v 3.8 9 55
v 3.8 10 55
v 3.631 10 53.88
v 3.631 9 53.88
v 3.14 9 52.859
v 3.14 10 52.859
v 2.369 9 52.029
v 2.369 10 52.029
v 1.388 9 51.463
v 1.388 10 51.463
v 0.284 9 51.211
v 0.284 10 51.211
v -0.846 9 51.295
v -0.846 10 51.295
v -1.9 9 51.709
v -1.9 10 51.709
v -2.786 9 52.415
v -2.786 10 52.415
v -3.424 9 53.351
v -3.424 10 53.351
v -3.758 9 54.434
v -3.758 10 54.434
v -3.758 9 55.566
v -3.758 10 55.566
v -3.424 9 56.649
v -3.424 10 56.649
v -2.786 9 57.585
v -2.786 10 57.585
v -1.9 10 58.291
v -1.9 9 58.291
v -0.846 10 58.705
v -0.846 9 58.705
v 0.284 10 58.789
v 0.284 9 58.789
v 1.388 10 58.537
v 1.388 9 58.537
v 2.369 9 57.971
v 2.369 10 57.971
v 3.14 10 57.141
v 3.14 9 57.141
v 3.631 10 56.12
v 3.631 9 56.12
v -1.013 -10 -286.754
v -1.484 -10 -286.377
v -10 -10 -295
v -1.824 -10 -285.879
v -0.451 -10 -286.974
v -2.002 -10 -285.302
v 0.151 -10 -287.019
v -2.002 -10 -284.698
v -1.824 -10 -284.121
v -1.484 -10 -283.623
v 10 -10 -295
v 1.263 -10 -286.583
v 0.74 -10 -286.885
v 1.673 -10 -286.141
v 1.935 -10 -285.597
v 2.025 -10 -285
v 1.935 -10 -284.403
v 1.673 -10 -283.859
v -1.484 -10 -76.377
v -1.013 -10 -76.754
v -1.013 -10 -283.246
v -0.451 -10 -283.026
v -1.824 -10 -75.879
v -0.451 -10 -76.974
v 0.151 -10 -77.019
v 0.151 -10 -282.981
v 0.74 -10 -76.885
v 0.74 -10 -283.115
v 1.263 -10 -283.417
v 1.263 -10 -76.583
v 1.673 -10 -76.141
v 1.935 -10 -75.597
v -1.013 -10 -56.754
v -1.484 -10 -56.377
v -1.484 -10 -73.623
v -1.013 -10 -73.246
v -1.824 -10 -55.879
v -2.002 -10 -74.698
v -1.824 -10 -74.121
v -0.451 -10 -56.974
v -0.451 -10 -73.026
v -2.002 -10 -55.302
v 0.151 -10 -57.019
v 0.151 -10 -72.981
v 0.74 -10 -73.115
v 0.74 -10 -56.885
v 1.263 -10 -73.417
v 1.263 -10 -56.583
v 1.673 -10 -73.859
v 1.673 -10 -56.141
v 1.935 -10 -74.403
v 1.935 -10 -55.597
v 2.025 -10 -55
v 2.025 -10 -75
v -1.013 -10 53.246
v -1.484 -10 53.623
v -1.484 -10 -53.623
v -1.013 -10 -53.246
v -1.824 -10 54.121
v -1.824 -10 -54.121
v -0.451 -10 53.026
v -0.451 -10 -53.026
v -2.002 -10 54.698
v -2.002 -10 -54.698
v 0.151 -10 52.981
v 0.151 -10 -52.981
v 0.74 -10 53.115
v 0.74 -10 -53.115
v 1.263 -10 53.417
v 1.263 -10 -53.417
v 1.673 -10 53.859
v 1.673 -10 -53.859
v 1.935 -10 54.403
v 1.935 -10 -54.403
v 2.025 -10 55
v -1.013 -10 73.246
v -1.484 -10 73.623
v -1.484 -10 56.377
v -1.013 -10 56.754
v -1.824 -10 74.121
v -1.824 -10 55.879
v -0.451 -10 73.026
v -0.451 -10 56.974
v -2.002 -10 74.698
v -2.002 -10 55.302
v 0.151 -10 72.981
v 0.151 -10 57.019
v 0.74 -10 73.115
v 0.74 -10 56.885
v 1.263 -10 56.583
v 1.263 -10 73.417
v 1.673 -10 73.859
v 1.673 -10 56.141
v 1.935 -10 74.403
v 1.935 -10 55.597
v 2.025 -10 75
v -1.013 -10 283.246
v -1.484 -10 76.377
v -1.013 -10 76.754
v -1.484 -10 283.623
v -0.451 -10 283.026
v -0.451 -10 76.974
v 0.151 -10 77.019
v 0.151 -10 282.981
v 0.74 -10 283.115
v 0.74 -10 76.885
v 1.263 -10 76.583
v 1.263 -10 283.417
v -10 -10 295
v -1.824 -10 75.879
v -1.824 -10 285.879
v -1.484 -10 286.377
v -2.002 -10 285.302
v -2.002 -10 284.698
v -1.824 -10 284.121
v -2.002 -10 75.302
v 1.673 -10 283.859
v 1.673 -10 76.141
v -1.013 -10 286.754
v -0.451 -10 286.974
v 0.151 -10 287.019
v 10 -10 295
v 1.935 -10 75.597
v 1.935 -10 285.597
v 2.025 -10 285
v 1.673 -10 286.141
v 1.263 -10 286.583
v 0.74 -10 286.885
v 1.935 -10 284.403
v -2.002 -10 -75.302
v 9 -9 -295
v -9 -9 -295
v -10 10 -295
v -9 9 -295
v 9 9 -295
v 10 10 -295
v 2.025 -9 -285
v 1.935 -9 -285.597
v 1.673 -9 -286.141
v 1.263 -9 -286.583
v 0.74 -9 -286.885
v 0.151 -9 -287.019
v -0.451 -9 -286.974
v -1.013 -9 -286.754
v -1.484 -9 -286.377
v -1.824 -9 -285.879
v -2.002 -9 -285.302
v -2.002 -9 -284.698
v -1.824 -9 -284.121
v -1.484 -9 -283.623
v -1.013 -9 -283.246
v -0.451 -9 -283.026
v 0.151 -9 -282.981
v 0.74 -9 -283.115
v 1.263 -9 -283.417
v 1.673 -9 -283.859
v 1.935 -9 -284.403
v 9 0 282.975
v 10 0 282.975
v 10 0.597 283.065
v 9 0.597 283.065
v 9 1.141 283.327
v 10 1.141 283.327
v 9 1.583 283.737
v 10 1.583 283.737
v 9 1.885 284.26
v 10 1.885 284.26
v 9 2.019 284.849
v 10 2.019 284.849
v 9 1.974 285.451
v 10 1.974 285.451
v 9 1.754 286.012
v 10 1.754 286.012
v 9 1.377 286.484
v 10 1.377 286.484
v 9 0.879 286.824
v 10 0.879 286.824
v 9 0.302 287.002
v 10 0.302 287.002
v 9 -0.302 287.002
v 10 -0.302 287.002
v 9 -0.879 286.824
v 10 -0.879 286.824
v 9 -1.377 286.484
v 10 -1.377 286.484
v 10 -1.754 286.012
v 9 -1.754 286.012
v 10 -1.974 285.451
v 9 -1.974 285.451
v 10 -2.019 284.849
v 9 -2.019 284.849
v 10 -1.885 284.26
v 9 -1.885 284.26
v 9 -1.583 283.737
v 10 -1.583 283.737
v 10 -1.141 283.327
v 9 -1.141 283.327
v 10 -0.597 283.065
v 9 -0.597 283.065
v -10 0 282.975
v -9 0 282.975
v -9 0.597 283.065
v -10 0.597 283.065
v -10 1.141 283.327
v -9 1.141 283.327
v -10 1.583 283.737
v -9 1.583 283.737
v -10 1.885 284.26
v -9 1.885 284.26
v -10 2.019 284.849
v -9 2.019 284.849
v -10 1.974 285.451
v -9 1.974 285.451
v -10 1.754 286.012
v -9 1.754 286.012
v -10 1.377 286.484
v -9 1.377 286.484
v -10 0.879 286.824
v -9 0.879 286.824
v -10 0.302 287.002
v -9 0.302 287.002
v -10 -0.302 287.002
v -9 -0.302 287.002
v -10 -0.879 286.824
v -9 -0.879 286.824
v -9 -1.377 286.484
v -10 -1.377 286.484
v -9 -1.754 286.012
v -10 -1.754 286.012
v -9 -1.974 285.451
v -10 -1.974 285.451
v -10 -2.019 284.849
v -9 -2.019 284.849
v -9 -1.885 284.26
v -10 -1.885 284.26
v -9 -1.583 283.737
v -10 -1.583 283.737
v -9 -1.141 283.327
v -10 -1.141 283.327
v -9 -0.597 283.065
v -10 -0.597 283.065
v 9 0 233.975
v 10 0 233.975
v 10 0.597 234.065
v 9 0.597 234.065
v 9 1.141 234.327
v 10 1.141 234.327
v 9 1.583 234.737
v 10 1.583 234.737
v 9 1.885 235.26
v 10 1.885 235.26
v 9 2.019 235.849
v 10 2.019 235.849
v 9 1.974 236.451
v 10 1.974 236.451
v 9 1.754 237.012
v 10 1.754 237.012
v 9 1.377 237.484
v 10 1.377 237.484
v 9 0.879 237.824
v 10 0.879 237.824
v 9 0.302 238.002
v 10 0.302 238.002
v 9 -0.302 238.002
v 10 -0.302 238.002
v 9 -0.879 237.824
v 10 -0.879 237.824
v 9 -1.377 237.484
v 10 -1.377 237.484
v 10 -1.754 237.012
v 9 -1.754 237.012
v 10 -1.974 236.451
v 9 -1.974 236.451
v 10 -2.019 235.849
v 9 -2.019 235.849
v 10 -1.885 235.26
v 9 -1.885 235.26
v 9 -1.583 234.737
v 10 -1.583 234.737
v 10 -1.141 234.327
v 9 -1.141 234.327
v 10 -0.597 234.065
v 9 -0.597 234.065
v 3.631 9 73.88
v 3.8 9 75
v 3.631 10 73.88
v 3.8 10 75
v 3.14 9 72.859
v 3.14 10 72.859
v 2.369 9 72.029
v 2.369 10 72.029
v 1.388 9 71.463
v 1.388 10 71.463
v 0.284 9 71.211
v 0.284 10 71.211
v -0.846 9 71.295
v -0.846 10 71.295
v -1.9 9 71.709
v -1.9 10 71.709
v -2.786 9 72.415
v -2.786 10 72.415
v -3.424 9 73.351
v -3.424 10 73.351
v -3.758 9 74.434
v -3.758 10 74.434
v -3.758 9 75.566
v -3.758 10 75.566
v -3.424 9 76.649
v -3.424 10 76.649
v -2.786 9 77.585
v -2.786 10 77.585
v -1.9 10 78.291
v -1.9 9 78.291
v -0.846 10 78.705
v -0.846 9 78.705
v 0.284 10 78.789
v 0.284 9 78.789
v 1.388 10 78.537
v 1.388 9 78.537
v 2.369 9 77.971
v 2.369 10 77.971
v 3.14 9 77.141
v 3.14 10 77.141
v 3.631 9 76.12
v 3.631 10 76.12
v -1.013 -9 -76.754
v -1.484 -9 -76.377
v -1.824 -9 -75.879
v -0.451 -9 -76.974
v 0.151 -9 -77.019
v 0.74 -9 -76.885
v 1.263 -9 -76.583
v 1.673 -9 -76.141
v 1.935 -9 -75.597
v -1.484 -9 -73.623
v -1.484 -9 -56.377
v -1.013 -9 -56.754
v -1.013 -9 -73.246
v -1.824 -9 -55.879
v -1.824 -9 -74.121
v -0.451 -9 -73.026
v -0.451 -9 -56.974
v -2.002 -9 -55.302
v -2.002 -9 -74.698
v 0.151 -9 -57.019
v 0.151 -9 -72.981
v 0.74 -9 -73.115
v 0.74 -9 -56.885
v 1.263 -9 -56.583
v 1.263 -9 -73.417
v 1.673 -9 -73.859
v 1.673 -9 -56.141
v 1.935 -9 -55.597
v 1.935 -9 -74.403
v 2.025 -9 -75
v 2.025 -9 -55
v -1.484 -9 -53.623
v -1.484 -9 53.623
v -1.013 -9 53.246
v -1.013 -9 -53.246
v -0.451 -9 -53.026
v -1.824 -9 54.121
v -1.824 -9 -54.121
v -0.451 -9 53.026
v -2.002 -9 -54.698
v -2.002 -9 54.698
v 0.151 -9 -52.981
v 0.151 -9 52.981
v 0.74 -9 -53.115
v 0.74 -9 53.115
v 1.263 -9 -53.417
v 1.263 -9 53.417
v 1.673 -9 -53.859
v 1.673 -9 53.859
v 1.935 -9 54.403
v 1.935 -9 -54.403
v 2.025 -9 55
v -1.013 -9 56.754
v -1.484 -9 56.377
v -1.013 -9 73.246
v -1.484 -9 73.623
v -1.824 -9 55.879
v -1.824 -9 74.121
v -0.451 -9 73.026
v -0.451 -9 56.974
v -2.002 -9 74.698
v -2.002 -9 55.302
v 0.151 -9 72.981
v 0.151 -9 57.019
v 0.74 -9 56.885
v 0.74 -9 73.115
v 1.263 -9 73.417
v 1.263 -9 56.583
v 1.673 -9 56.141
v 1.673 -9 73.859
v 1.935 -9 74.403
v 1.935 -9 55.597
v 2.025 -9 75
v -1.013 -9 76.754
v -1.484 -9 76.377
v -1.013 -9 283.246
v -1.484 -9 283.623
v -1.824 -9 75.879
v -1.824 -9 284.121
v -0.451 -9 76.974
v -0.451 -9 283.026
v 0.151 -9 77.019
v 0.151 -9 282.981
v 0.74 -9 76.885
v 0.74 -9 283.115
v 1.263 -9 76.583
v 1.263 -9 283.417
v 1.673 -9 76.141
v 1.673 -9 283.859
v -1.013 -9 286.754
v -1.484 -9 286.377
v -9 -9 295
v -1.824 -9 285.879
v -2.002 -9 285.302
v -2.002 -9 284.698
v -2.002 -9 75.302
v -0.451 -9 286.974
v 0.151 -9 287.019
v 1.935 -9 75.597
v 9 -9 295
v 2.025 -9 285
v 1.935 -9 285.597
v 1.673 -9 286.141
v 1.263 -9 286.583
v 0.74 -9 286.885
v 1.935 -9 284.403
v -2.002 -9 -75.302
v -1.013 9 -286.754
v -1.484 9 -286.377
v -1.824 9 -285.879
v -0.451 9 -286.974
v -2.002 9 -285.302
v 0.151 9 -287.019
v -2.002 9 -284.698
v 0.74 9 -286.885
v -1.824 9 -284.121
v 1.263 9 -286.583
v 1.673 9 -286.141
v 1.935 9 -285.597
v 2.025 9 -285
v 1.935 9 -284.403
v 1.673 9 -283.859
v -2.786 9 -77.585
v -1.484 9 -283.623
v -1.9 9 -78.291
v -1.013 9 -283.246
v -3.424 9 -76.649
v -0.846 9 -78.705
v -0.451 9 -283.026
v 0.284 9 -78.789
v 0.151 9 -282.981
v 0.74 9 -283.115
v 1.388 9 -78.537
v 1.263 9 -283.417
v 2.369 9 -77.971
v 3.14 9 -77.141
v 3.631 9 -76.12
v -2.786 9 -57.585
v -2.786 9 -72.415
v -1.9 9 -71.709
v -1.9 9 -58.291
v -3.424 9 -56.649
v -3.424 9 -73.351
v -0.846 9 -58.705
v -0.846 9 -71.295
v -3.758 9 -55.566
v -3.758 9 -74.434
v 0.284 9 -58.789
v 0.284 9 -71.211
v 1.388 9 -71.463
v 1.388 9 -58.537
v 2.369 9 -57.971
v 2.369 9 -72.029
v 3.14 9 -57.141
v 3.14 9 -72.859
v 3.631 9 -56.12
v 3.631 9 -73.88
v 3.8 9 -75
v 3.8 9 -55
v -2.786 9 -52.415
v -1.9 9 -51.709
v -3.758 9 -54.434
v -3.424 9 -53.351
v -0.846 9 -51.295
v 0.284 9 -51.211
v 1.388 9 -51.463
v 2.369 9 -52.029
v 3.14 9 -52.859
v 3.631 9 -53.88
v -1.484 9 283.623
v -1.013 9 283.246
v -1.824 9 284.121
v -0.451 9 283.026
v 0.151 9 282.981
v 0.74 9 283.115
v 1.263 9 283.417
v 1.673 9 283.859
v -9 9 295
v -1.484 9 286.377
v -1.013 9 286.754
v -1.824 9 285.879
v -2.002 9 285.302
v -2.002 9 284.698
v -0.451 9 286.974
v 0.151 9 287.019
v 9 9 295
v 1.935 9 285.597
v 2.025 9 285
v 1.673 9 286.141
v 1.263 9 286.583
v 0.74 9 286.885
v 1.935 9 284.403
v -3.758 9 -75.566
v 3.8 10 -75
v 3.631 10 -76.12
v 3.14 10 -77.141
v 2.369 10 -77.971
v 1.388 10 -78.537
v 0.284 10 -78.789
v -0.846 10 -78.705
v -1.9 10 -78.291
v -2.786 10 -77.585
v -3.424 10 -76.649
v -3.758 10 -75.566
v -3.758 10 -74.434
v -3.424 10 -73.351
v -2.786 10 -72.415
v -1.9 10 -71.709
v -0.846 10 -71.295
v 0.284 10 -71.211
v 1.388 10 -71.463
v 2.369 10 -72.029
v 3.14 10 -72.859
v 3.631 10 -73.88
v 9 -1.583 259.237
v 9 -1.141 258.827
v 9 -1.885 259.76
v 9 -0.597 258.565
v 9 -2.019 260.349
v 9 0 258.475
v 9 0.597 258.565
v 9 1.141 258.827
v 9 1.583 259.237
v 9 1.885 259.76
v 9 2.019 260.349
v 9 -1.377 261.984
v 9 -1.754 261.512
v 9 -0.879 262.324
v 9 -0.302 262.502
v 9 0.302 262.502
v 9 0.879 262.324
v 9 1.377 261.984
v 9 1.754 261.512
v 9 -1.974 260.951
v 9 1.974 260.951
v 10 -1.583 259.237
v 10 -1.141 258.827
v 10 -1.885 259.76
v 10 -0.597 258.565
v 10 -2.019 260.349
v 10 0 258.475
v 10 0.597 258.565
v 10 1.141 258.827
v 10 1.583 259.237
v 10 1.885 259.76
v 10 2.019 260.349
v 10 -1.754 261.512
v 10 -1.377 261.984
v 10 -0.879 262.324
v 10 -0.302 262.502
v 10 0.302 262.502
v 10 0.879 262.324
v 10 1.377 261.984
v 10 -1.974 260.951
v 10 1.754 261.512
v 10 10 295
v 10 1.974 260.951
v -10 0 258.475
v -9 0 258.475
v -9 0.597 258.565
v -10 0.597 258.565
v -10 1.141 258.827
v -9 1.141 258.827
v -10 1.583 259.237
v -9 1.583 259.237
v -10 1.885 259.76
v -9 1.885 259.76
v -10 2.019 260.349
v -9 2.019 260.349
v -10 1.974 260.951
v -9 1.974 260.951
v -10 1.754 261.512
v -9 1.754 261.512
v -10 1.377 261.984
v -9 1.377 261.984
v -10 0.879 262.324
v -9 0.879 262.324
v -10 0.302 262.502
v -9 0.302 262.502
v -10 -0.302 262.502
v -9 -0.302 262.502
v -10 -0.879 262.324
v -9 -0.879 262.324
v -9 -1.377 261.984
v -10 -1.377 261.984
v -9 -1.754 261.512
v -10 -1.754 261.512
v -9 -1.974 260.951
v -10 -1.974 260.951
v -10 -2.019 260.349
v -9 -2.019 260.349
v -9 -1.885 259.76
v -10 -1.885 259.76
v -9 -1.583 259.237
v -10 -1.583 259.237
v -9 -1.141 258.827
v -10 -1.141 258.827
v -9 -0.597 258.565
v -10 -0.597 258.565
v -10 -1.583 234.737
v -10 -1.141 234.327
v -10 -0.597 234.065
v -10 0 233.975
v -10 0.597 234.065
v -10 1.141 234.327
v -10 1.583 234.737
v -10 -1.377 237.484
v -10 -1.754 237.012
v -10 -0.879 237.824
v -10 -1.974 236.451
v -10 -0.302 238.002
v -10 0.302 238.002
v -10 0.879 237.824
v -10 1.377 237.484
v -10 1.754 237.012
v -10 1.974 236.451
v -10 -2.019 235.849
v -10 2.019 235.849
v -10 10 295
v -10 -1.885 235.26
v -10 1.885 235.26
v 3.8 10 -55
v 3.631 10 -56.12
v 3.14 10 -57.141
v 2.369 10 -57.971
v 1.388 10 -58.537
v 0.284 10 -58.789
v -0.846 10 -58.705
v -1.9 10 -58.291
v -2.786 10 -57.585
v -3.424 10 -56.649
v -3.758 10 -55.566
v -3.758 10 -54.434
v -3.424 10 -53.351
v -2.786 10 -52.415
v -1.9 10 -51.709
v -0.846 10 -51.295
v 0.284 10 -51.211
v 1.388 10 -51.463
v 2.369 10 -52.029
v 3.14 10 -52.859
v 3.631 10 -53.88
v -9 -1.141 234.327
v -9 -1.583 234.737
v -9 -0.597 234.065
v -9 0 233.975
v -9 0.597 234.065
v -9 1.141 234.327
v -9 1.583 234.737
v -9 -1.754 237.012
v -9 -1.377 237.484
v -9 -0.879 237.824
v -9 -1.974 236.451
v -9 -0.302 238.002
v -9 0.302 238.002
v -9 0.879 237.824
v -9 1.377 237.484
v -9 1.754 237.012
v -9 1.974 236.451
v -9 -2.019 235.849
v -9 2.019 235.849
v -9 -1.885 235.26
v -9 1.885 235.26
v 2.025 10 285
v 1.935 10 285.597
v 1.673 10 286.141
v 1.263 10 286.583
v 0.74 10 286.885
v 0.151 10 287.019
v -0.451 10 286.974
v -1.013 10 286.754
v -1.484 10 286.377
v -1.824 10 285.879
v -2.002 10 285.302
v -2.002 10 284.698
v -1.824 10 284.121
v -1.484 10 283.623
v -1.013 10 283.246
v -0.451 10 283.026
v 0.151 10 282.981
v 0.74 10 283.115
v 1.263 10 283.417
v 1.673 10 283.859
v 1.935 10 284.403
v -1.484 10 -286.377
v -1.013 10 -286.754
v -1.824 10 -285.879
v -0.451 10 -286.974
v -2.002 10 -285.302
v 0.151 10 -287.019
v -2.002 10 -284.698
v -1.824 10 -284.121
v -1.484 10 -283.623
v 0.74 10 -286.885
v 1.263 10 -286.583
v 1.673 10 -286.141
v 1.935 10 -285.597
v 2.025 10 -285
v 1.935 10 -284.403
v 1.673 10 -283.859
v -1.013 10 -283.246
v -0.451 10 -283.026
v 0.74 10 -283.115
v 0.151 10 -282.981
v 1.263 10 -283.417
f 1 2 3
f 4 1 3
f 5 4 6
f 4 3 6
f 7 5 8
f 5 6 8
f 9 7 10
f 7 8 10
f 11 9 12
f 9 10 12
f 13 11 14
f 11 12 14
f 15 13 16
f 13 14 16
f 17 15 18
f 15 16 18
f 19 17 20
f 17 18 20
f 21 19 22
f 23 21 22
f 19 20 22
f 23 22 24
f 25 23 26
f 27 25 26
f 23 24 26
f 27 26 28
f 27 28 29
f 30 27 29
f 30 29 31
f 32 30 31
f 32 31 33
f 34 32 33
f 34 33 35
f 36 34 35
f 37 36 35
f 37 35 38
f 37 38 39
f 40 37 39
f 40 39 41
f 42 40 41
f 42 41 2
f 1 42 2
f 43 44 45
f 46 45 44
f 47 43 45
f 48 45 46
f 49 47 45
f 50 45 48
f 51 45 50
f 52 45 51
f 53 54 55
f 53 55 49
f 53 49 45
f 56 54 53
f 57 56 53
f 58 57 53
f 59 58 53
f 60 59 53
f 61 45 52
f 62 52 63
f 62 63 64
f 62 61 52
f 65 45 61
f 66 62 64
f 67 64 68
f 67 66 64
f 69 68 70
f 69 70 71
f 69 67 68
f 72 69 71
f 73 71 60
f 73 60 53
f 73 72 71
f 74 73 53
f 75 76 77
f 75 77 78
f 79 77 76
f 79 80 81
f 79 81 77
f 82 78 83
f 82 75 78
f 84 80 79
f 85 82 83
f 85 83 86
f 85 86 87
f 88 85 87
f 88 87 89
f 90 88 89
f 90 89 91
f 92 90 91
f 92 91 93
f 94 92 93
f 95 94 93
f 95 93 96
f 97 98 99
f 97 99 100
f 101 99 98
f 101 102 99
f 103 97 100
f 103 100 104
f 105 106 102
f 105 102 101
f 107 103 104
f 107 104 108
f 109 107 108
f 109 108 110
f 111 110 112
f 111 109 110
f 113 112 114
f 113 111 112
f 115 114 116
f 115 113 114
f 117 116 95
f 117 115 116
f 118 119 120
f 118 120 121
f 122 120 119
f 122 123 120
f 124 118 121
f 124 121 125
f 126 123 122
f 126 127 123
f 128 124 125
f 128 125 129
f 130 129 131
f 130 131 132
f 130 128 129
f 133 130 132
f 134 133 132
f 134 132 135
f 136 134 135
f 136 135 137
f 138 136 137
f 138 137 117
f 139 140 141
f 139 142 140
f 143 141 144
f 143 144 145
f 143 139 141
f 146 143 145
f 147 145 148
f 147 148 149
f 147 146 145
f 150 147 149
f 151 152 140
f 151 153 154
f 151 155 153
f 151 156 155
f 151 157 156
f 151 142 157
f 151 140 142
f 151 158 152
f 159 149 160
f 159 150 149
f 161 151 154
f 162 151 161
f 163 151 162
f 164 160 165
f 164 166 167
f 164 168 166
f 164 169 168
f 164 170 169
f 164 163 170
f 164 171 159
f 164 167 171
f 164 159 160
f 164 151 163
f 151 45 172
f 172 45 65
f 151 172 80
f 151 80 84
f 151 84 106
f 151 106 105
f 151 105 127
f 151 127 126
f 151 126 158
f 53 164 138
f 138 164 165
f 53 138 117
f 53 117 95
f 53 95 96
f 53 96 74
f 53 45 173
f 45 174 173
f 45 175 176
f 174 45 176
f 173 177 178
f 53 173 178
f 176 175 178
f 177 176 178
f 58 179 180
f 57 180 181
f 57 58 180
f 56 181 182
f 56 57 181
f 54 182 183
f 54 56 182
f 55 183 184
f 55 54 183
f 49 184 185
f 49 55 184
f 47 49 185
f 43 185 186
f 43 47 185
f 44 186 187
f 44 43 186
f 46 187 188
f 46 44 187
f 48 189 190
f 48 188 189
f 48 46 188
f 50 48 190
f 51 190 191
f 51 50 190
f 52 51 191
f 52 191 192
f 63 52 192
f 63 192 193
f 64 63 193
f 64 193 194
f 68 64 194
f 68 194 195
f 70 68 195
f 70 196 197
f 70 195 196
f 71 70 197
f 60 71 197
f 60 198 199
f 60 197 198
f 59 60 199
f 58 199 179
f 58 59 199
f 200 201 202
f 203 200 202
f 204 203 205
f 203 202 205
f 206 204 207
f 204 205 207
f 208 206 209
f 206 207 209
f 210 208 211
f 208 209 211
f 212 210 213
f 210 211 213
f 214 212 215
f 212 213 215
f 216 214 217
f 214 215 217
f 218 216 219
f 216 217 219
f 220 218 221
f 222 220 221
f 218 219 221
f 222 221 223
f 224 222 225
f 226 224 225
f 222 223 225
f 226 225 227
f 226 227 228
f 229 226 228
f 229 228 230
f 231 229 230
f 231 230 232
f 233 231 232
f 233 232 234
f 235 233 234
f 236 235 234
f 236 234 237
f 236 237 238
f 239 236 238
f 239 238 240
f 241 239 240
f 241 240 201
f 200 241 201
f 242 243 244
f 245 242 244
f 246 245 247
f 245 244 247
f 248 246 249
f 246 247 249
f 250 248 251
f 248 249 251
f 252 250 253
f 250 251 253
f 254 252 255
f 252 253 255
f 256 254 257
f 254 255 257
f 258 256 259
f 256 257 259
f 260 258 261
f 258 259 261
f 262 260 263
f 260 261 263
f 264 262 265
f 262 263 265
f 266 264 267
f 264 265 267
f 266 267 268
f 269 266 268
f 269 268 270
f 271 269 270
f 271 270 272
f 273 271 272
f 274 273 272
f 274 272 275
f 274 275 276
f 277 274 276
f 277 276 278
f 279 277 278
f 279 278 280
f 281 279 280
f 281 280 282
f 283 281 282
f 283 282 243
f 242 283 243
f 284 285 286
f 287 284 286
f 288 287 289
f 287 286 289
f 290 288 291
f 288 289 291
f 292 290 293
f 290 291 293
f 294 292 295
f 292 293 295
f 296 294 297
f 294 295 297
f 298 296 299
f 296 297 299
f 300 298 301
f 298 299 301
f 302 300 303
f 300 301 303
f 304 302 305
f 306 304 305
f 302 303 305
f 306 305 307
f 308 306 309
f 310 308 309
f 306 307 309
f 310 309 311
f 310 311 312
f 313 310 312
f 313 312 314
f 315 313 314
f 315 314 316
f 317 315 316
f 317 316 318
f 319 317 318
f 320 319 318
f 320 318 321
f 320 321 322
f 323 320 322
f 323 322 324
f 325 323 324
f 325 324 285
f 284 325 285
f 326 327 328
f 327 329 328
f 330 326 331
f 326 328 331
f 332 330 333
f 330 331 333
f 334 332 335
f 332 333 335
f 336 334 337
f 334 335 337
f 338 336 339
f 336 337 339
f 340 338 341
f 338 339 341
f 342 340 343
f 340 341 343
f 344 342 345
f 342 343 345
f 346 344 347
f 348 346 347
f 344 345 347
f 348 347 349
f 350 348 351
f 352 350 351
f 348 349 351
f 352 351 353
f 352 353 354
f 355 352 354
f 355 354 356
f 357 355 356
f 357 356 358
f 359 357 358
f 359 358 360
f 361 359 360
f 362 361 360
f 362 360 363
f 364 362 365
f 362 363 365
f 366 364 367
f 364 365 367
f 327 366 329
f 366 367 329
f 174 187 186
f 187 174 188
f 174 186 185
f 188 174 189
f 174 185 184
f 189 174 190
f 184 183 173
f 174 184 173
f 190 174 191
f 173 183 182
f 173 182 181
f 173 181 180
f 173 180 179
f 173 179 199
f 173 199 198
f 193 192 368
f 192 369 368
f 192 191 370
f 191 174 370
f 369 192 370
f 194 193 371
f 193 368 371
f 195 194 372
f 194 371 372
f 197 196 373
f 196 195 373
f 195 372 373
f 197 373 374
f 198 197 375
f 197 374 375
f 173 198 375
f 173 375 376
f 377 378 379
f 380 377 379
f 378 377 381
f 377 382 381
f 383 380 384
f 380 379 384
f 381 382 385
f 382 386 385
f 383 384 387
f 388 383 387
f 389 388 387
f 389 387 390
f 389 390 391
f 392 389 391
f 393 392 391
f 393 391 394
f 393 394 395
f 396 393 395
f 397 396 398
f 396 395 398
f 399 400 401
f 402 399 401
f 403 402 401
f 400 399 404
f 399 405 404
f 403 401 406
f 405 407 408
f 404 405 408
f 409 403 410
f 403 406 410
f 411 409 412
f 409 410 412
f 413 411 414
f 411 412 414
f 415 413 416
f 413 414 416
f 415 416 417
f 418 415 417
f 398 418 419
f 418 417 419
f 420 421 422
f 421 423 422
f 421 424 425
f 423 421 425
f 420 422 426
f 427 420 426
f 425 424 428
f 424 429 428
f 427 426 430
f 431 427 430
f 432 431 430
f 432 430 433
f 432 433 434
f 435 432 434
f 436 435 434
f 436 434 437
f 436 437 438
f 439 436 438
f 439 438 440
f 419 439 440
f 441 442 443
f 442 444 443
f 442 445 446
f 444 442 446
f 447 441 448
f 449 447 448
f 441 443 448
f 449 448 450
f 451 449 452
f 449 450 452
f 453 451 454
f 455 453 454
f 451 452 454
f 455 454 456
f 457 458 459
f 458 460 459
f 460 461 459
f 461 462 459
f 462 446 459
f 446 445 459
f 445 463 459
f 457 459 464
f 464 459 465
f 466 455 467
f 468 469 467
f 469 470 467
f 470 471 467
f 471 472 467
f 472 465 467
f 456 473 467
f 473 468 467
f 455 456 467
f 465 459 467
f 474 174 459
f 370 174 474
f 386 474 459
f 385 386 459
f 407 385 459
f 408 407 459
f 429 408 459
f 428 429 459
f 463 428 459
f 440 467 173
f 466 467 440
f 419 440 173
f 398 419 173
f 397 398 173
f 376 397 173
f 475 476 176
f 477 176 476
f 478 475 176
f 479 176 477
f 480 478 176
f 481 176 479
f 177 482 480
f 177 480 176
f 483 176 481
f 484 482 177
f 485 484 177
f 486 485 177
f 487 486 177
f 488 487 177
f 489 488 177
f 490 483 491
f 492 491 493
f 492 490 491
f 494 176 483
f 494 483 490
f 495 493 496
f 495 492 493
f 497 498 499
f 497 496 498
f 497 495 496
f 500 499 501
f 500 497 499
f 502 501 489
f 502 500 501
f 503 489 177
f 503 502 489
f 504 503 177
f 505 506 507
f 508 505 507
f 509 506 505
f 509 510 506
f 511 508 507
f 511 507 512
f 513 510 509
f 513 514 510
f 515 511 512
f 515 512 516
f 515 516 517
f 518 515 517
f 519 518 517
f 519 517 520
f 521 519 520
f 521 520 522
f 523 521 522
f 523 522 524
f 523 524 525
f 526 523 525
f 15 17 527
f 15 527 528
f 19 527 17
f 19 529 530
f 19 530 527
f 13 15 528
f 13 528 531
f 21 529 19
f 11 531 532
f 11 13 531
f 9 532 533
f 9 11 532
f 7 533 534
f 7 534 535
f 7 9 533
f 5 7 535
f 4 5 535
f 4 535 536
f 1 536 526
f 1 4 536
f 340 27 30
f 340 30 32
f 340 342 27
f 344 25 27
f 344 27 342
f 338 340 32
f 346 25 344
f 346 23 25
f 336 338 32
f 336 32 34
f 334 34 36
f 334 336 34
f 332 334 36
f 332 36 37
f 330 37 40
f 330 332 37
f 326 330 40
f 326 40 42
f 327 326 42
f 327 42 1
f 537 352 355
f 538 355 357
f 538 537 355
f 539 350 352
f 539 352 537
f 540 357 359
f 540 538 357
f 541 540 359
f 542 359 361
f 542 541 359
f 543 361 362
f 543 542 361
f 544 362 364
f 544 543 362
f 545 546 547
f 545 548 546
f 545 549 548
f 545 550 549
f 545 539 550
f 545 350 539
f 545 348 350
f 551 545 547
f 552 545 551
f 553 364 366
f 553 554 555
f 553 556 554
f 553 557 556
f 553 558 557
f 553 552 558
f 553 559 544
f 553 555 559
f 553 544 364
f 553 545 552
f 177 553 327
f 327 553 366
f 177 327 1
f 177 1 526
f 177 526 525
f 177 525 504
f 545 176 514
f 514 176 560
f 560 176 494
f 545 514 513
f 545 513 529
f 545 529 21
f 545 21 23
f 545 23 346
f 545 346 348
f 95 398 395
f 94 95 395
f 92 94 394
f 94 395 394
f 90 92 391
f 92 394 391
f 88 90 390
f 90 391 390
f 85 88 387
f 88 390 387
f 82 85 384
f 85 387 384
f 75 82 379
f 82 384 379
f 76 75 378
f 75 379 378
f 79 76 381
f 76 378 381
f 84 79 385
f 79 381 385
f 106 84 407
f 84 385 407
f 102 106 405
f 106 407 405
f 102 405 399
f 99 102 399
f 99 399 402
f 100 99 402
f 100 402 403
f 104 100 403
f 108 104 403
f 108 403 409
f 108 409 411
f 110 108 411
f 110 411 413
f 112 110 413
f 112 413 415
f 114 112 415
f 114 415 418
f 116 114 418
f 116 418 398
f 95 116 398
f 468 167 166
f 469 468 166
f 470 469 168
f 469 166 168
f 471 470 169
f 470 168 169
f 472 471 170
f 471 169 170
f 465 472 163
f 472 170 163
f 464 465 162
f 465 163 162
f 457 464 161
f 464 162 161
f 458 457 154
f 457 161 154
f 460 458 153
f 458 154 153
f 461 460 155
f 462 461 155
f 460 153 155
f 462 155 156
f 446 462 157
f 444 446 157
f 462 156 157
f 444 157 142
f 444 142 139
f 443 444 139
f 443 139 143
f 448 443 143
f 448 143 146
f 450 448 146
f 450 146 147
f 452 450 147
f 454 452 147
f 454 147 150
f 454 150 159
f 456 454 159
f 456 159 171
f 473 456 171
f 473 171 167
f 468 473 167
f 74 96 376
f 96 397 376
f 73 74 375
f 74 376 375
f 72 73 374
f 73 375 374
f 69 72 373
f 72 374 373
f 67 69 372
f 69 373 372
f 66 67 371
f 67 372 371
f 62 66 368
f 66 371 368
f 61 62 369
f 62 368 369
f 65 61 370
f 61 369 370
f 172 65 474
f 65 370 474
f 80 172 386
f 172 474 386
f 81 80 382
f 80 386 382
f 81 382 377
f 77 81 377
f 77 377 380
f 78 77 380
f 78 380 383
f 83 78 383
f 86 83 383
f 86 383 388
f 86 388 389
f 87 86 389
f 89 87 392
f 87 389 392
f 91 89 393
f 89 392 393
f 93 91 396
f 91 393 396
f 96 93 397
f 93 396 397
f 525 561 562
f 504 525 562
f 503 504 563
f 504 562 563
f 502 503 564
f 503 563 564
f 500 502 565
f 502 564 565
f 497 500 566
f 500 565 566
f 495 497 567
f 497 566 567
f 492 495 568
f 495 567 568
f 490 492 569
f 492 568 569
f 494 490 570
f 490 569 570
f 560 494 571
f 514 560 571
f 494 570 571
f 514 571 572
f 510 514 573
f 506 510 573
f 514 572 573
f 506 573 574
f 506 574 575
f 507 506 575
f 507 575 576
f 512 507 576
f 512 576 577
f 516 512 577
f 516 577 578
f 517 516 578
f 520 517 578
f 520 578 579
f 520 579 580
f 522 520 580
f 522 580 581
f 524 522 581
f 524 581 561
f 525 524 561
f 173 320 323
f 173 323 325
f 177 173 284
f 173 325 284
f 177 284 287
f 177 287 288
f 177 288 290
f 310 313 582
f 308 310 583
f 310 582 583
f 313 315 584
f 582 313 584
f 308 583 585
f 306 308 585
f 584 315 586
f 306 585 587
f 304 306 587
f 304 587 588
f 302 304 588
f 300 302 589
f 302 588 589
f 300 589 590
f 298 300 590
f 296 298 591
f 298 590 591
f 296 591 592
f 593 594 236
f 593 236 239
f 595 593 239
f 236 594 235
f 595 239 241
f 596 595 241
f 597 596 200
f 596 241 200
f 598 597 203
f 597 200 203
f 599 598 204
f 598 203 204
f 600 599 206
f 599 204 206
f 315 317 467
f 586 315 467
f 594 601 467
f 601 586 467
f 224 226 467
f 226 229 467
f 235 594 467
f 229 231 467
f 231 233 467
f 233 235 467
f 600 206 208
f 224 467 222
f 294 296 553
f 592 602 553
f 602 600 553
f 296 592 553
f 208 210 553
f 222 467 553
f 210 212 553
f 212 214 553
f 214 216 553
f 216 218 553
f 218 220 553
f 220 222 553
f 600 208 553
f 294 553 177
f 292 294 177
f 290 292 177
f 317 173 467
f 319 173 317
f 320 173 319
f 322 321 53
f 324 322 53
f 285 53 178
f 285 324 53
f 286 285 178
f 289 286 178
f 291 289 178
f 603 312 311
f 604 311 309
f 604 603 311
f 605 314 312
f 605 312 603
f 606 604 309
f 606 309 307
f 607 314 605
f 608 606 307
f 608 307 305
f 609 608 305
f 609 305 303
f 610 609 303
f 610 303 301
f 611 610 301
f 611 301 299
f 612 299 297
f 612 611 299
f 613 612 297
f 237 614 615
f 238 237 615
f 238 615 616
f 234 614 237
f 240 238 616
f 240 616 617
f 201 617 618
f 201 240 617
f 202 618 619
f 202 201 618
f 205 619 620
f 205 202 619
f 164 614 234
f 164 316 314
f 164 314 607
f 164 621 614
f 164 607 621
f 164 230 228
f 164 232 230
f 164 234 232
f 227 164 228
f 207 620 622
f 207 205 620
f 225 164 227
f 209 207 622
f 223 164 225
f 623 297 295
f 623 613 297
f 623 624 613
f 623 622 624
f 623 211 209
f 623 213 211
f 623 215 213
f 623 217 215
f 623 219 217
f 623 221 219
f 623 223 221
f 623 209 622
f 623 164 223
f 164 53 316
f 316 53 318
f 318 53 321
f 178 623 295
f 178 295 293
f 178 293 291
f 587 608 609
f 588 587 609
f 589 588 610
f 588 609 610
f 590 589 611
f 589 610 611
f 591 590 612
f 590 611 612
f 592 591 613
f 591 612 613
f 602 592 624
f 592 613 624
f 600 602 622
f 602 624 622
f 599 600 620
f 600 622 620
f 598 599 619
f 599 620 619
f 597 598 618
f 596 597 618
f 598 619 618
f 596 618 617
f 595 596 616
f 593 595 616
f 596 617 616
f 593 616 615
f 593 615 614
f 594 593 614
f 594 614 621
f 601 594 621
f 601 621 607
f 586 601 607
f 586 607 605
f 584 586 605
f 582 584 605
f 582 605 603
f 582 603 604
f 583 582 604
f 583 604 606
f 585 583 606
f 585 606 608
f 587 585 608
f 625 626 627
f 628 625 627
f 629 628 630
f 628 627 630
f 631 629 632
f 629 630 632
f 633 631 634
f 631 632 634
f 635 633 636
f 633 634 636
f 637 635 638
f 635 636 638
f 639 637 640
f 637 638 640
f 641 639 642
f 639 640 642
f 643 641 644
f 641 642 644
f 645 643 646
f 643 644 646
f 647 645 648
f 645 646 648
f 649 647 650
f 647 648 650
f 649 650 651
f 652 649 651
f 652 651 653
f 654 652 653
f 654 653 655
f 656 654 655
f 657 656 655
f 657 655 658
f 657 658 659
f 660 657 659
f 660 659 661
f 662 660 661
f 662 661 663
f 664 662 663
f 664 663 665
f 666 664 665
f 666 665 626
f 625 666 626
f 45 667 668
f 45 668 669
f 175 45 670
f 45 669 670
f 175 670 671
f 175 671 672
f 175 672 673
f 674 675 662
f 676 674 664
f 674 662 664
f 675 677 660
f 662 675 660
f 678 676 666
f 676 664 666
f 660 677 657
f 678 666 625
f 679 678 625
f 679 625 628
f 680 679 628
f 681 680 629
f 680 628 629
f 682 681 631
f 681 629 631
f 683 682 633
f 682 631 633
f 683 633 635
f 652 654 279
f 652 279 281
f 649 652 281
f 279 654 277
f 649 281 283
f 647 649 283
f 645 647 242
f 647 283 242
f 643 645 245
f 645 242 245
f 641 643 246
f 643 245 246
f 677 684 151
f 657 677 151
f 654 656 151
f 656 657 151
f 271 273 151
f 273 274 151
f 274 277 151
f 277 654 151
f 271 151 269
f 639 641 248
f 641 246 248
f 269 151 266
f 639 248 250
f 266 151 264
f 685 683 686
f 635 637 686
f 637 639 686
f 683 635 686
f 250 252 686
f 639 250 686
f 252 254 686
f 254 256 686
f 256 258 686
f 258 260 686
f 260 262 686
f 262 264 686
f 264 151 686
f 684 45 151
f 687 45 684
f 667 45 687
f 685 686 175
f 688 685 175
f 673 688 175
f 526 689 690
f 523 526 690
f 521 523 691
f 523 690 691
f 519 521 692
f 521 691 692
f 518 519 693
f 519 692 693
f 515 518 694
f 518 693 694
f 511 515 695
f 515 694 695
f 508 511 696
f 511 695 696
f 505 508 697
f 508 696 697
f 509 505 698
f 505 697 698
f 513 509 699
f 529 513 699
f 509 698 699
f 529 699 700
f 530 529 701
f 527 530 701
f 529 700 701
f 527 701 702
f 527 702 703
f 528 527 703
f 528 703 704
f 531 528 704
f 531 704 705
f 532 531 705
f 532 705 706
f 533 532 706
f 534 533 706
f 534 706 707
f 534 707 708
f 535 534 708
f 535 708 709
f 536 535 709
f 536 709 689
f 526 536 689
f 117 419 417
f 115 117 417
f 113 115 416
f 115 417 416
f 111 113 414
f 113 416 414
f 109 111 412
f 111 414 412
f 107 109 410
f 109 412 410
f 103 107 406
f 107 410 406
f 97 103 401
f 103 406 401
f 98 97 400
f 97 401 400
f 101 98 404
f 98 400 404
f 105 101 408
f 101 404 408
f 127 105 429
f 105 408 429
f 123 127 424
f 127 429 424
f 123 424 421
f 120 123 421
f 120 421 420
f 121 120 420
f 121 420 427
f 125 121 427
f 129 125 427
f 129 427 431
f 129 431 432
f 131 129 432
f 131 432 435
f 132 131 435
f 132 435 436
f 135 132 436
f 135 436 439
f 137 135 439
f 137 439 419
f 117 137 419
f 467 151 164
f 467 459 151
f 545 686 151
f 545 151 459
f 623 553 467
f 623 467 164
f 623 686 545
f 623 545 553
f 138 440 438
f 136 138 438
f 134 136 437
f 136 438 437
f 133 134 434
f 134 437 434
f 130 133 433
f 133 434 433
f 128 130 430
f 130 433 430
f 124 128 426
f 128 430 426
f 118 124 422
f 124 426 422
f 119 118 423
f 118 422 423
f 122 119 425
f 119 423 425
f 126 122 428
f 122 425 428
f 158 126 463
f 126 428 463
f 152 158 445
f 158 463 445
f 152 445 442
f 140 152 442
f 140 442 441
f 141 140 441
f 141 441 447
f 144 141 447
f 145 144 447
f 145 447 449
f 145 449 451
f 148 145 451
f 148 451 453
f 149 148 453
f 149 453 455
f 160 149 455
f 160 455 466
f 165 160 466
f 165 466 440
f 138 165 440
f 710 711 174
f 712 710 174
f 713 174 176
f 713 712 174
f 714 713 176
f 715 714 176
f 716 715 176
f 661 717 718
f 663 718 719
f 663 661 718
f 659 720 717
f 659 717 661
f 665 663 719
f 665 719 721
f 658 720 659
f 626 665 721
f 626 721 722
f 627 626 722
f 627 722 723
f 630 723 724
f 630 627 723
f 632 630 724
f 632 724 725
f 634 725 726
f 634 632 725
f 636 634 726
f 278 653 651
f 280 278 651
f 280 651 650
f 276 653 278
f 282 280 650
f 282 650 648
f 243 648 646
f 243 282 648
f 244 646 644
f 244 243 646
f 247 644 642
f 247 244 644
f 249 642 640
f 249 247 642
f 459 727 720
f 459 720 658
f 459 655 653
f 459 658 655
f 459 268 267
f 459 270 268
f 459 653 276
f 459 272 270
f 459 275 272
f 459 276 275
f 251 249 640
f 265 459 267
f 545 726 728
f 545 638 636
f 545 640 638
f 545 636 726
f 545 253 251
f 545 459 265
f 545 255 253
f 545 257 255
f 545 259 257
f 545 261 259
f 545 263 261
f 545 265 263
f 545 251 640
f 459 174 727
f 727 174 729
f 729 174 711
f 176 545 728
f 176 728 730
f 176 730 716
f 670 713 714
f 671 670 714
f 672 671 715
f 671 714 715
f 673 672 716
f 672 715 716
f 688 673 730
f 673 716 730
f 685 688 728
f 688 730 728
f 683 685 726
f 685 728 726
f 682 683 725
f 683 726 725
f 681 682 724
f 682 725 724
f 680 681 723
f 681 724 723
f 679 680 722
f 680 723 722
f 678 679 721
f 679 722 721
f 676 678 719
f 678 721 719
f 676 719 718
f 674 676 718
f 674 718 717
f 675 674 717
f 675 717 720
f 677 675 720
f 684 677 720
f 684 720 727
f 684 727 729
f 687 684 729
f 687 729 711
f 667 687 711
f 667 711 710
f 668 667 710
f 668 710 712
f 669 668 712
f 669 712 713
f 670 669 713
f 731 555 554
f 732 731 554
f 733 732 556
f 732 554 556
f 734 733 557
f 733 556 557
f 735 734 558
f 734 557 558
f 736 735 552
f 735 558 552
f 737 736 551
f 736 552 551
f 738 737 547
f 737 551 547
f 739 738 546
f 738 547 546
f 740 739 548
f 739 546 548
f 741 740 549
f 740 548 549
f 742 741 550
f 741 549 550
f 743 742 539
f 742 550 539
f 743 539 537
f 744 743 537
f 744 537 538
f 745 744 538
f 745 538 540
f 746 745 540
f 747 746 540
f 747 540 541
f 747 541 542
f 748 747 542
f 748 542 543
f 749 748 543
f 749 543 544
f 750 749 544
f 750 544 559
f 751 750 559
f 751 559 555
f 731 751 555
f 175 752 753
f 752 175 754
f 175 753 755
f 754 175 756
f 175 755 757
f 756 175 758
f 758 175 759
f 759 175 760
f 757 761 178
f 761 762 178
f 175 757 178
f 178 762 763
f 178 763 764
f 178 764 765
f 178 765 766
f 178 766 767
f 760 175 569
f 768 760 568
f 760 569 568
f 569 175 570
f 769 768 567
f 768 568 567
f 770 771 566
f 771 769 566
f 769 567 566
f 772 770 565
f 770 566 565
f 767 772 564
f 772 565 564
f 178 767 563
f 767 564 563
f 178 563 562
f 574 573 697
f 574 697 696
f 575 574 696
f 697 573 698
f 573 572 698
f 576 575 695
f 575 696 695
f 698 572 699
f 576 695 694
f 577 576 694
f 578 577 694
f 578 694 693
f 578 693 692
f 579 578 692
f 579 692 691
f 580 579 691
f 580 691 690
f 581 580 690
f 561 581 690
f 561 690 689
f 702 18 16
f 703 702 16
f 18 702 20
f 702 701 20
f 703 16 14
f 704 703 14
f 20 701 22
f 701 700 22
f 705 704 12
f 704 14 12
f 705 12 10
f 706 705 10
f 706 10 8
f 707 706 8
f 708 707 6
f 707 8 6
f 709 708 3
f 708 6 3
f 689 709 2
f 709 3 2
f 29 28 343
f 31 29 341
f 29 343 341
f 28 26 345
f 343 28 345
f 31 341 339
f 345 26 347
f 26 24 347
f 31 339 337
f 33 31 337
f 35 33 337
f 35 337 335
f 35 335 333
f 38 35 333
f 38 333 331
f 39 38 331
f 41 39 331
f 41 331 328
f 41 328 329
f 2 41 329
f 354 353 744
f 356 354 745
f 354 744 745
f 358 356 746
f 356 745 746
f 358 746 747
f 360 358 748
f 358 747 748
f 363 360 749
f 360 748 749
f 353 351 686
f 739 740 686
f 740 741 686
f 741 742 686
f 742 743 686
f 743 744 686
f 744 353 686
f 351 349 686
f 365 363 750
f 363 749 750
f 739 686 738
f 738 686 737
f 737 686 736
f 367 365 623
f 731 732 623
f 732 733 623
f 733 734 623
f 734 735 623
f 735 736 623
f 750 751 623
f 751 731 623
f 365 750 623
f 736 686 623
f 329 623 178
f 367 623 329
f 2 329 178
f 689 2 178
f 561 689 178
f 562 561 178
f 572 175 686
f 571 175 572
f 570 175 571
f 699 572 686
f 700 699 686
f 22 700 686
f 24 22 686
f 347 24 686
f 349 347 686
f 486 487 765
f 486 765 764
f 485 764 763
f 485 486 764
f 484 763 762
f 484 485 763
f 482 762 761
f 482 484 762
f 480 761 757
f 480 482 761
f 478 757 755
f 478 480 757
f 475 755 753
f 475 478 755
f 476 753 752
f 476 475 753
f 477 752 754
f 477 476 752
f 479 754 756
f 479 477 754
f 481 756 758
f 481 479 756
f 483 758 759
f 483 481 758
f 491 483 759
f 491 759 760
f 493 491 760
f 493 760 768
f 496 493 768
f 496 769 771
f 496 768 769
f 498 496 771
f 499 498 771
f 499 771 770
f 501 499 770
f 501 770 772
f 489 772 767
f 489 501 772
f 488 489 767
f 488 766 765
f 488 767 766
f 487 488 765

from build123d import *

# Parameters (mm, degrees)
SKETCH_1_W           = 20
SKETCH_1_H           = 20
SKETCH_1_W_2         = 18
SKETCH_1_H_2         = 18
EXTRUDE_1_DEPTH      = 295
SKETCH_2_R           = 2.025
CUT_EXTRUDE_1_DEPTH  = 45
SKETCH_3_R           = 3.8
CUT_EXTRUDE_2_DEPTH  = 5
SKETCH_4_R           = 2.025
CUT_EXTRUDE_3_DEPTH  = 73
SKETCH_15_R          = 2.025
CUT_EXTRUDE_14_DEPTH = 70


with BuildPart() as part:
    # 草图1 → 凸台-拉伸1 (new body, symmetric)
    with BuildSketch(Plane.XY):
        Rectangle(SKETCH_1_W, SKETCH_1_H)
        Rectangle(SKETCH_1_W_2, SKETCH_1_H_2, mode=Mode.SUBTRACT)
    extrude(amount=EXTRUDE_1_DEPTH, both=True)

    # 草图2 → 切除-拉伸1 (cut, symmetric)
    with BuildSketch(Plane(origin=(0, 10, 0), x_dir=(1, 0, 0), z_dir=(0, 1, 0))):
        with Locations((0, -75)):
            Circle(SKETCH_2_R)
        with Locations((0, -55)):
            Circle(SKETCH_2_R)
        with Locations((0, 55)):
            Circle(SKETCH_2_R)
        with Locations((0, 75)):
            Circle(SKETCH_2_R)
    extrude(amount=CUT_EXTRUDE_1_DEPTH, both=True, mode=Mode.SUBTRACT)

    # 草图3 → 切除-拉伸2 (cut, symmetric)
    with BuildSketch(Plane(origin=(0, 10, 0), x_dir=(1, 0, 0), z_dir=(0, 1, 0))):
        with Locations((0, 75)):
            Circle(SKETCH_3_R)
        with Locations((0, 55)):
            Circle(SKETCH_3_R)
        with Locations((0, -55)):
            Circle(SKETCH_3_R)
        with Locations((0, -75)):
            Circle(SKETCH_3_R)
    extrude(amount=CUT_EXTRUDE_2_DEPTH, both=True, mode=Mode.SUBTRACT)

    # 草图4 → 切除-拉伸3 (cut)
    with BuildSketch(Plane(origin=(10, 0, 0), x_dir=(0, 0, -1), z_dir=(1, 0, 0))):
        with Locations((-236, 0)):
            Circle(SKETCH_4_R)
        with Locations((-260.5, 0)):
            Circle(SKETCH_4_R)
        with Locations((-285, 0)):
            Circle(SKETCH_4_R)
    extrude(amount=-CUT_EXTRUDE_3_DEPTH, mode=Mode.SUBTRACT)

    # 草图15 → 切除-拉伸14 (cut)
    with BuildSketch(Plane.XZ.offset(10)):
        with Locations((0, 285)):
            Circle(SKETCH_15_R)
    cut_extrude_14 = extrude(amount=-CUT_EXTRUDE_14_DEPTH, mode=Mode.SUBTRACT)

    # 镜向2: 切除-拉伸14 across plane
    add(cut_extrude_14.mirror(Plane.XY), mode=Mode.SUBTRACT)


solid = part.part
